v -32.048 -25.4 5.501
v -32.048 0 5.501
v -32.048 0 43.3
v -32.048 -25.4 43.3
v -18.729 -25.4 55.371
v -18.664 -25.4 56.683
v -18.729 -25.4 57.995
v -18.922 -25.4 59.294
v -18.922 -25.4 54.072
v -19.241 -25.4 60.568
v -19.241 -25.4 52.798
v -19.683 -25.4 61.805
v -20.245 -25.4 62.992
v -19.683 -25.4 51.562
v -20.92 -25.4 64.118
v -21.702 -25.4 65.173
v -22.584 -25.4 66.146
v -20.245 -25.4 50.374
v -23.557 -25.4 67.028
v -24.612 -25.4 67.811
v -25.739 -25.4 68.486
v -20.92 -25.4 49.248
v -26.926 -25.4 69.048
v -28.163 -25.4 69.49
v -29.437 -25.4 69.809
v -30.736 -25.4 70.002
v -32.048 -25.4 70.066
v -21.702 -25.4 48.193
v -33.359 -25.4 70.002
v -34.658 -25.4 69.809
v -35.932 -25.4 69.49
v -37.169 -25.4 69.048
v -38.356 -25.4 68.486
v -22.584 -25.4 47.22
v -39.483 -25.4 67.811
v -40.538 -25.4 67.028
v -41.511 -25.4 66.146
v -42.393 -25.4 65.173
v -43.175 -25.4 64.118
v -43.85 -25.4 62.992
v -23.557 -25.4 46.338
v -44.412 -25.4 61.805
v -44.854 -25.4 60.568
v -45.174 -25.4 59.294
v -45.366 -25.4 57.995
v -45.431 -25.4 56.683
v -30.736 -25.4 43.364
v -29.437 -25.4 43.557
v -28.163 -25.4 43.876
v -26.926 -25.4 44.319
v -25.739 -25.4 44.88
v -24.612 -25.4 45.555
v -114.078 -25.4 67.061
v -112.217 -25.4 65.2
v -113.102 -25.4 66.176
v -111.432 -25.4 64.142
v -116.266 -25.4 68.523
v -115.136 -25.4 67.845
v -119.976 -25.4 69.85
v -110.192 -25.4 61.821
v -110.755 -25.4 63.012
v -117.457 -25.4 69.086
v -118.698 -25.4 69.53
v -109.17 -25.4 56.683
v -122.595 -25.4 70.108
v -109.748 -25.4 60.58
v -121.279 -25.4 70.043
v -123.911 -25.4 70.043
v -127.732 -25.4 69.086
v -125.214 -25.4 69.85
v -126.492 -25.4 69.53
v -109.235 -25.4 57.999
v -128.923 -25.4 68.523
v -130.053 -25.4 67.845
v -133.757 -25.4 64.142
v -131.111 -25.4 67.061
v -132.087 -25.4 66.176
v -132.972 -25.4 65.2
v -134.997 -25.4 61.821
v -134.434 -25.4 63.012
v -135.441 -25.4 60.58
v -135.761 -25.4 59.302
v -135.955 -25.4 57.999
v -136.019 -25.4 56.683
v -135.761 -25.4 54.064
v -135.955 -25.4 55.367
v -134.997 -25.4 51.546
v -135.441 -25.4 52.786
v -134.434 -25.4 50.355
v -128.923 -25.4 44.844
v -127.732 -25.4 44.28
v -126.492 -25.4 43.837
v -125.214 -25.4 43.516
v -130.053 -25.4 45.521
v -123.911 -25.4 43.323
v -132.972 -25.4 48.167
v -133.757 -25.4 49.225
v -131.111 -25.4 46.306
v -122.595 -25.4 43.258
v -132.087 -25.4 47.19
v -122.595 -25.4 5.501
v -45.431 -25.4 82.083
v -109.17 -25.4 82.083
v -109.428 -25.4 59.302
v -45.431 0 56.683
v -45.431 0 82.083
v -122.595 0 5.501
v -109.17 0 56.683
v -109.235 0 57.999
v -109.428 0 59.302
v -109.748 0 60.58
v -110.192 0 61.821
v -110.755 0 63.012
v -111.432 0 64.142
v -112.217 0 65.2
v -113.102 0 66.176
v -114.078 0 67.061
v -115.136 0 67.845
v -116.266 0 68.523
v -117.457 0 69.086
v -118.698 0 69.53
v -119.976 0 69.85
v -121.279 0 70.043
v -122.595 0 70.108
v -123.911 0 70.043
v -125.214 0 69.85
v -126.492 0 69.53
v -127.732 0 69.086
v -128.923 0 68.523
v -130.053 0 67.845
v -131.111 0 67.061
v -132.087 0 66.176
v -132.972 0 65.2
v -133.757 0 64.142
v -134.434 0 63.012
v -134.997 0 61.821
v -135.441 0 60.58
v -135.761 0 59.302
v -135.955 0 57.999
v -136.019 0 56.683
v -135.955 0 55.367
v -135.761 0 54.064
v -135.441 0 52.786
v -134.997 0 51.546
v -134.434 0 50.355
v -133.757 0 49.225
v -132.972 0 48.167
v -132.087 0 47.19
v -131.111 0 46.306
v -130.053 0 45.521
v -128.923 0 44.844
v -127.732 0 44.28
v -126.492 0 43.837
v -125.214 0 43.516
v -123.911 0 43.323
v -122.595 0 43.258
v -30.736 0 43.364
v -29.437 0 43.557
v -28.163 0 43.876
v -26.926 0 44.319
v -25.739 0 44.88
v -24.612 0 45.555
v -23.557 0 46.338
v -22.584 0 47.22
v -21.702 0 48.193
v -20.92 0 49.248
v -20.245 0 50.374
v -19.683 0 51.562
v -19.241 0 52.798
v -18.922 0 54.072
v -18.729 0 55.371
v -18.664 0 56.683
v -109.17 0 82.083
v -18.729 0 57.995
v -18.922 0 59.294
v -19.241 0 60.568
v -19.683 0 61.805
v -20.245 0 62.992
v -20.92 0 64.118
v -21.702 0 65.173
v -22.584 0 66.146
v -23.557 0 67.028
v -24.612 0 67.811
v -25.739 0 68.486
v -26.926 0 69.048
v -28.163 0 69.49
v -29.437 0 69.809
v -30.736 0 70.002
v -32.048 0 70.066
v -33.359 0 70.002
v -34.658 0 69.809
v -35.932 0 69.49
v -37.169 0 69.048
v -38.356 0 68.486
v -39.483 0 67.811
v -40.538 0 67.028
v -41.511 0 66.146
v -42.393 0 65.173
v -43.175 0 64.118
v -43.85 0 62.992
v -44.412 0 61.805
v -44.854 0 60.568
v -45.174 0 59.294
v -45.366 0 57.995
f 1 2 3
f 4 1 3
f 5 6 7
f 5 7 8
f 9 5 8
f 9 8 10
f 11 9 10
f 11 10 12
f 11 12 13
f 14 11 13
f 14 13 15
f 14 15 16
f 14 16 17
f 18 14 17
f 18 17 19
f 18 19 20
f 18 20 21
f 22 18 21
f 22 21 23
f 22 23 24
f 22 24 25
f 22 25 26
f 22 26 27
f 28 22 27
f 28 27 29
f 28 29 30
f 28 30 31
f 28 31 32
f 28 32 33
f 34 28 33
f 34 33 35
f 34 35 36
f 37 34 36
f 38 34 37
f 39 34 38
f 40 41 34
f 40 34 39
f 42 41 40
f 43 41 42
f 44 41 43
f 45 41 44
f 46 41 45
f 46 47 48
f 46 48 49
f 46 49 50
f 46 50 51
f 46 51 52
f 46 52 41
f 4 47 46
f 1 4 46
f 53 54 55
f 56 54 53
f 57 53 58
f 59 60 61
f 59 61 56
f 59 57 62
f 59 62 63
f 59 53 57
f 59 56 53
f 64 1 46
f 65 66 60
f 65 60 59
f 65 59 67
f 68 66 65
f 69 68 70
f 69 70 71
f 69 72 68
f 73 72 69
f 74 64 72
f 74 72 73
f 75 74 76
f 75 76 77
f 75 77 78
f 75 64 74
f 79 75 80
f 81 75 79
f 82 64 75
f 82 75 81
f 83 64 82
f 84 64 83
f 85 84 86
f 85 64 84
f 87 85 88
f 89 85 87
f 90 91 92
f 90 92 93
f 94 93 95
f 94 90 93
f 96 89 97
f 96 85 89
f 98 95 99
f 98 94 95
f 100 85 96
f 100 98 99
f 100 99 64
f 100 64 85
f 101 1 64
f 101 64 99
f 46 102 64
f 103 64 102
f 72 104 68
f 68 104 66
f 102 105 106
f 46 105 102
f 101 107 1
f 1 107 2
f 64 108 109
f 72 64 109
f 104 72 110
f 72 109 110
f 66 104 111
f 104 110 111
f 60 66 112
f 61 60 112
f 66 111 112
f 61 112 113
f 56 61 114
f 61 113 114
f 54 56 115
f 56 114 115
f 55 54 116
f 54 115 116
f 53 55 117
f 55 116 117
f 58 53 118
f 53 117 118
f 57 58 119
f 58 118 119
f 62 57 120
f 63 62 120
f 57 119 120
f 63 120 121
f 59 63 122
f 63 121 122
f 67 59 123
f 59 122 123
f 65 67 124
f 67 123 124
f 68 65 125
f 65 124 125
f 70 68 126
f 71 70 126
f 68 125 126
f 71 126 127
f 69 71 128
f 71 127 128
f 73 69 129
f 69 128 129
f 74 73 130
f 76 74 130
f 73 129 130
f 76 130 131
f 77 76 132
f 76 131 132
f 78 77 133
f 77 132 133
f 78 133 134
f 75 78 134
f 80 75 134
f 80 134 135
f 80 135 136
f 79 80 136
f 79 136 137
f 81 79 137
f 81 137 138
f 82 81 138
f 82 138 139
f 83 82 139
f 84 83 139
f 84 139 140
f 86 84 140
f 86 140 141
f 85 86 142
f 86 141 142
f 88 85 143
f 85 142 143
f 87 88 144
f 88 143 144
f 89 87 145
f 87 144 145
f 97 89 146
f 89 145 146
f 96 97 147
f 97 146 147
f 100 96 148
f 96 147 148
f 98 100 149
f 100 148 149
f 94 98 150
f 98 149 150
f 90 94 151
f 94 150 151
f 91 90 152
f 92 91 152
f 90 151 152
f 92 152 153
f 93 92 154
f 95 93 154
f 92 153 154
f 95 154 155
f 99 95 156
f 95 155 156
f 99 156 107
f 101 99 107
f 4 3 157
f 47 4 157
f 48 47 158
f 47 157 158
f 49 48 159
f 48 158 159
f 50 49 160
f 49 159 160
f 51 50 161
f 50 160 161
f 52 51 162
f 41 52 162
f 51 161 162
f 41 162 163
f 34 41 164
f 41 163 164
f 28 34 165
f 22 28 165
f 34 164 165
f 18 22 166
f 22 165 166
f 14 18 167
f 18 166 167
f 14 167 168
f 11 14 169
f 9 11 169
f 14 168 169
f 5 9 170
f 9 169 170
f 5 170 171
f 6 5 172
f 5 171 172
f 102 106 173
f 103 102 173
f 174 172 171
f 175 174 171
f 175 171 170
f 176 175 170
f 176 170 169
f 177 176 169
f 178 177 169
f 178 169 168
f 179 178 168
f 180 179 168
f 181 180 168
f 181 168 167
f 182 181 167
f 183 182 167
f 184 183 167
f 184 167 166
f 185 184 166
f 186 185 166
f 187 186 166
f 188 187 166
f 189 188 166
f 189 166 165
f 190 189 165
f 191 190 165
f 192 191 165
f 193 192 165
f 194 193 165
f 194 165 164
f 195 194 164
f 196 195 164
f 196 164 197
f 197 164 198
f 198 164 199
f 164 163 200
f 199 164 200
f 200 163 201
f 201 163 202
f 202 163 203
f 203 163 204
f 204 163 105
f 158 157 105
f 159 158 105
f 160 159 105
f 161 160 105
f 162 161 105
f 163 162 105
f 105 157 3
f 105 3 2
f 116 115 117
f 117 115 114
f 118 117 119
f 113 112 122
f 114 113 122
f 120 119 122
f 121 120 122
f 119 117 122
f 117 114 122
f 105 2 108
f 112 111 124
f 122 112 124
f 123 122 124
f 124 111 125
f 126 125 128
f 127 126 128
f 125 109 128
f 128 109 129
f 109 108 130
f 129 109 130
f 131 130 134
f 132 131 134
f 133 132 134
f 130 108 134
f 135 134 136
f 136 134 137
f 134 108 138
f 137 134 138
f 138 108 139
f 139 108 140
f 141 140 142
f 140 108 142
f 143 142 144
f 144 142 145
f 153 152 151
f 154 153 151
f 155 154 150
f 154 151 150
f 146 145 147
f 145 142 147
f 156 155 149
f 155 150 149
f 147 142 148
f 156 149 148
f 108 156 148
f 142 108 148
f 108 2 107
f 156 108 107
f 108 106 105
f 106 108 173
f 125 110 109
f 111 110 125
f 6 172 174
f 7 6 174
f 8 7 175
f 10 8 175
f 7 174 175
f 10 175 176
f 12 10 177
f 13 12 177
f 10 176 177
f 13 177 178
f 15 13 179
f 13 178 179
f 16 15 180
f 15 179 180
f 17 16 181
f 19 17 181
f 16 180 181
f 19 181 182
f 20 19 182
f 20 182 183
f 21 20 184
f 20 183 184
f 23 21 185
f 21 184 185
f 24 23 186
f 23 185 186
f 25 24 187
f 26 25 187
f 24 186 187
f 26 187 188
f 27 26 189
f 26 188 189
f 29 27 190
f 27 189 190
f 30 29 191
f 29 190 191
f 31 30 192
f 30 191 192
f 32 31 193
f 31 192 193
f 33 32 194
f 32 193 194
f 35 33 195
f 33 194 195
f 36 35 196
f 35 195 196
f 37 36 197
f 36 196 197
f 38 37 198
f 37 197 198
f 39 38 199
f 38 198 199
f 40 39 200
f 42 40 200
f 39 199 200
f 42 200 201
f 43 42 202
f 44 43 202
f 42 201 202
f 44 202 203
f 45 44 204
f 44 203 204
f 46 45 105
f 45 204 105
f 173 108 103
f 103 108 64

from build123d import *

# Parameters (mm, degrees)
F1_DEPTH = 25.4
F2_DEPTH = 25.4
F3_R     = 9.9934379812
F4_DEPTH = 25.4


with BuildPart() as f1:
    # F0 (on Front) → F1 (new body)
    with BuildSketch(Plane.XZ):
        with BuildLine():
            Line((-122.5946694613, 43.2584390598), (-122.5946694613, 56.6831417382))
            Line((-122.5946694613, 56.6831417382), (-109.1699667829, 56.6831417382))
            ThreePointArc((-109.1699667829, 56.6831417382), (-132.0873677605, 66.1758400375), (-122.5946694613, 43.2584390598))
        make_face()
        with BuildLine():
            Line((-109.1699667829, 56.6831417382), (-122.5946694613, 56.6831417382))
            Line((-122.5946694613, 56.6831417382), (-122.5946694613, 43.2584390598))
            ThreePointArc((-122.5946694613, 43.2584390598), (-113.101971162, 47.1904434389), (-109.1699667829, 56.6831417382))
        make_face()
        with BuildLine():
            Line((-45.4307209175, 56.6831417382), (-109.1699667829, 56.6831417382))
            ThreePointArc((-109.1699667829, 56.6831417382), (-113.101971162, 47.1904434389), (-122.5946694613, 43.2584390598))
            Line((-122.5946694613, 43.2584390598), (-122.5946694613, 5.5007226765))
            Line((-122.5946694613, 5.5007226765), (-32.0475660264, 5.5007226765))
            Line((-32.0475660264, 5.5007226765), (-32.0475660264, 43.2999868471))
            ThreePointArc((-32.0475660264, 43.2999868471), (-41.5108856036, 47.2198221611), (-45.4307209175, 56.6831417382))
        make_face()
        with BuildLine():
            ThreePointArc((-18.6644111354, 56.6831417382), (-32.0475660264, 70.0662966292), (-45.4307209175, 56.6831417382))
            Line((-45.4307209175, 56.6831417382), (-32.0475660264, 56.6831417382))
            Line((-32.0475660264, 56.6831417382), (-32.0475660264, 43.2999868471))
            ThreePointArc((-32.0475660264, 43.2999868471), (-22.5842464493, 47.2198221611), (-18.6644111354, 56.6831417382))
        make_face()
        with BuildLine():
            Line((-32.0475660264, 56.6831417382), (-45.4307209175, 56.6831417382))
            ThreePointArc((-45.4307209175, 56.6831417382), (-41.5108856036, 47.2198221611), (-32.0475660264, 43.2999868471))
            Line((-32.0475660264, 43.2999868471), (-32.0475660264, 56.6831417382))
        make_face()
    extrude(amount=F1_DEPTH)

    # F2 (add): a face of the model
    f2_faces = [f1.faces().sort_by_distance(p)[0] for p in [
        (-77.3003438502, -12.7, 56.6831417382),
    ]]
    extrude(f2_faces, amount=F2_DEPTH)

    # F3 (on face) → F4 (join)
    with BuildSketch(Plane.XZ.offset(25.4)):
        with Locations((-32.0475660264, 56.6831417382)):
            Circle(F3_R)
    extrude(amount=-F4_DEPTH)


solid = f1.part
